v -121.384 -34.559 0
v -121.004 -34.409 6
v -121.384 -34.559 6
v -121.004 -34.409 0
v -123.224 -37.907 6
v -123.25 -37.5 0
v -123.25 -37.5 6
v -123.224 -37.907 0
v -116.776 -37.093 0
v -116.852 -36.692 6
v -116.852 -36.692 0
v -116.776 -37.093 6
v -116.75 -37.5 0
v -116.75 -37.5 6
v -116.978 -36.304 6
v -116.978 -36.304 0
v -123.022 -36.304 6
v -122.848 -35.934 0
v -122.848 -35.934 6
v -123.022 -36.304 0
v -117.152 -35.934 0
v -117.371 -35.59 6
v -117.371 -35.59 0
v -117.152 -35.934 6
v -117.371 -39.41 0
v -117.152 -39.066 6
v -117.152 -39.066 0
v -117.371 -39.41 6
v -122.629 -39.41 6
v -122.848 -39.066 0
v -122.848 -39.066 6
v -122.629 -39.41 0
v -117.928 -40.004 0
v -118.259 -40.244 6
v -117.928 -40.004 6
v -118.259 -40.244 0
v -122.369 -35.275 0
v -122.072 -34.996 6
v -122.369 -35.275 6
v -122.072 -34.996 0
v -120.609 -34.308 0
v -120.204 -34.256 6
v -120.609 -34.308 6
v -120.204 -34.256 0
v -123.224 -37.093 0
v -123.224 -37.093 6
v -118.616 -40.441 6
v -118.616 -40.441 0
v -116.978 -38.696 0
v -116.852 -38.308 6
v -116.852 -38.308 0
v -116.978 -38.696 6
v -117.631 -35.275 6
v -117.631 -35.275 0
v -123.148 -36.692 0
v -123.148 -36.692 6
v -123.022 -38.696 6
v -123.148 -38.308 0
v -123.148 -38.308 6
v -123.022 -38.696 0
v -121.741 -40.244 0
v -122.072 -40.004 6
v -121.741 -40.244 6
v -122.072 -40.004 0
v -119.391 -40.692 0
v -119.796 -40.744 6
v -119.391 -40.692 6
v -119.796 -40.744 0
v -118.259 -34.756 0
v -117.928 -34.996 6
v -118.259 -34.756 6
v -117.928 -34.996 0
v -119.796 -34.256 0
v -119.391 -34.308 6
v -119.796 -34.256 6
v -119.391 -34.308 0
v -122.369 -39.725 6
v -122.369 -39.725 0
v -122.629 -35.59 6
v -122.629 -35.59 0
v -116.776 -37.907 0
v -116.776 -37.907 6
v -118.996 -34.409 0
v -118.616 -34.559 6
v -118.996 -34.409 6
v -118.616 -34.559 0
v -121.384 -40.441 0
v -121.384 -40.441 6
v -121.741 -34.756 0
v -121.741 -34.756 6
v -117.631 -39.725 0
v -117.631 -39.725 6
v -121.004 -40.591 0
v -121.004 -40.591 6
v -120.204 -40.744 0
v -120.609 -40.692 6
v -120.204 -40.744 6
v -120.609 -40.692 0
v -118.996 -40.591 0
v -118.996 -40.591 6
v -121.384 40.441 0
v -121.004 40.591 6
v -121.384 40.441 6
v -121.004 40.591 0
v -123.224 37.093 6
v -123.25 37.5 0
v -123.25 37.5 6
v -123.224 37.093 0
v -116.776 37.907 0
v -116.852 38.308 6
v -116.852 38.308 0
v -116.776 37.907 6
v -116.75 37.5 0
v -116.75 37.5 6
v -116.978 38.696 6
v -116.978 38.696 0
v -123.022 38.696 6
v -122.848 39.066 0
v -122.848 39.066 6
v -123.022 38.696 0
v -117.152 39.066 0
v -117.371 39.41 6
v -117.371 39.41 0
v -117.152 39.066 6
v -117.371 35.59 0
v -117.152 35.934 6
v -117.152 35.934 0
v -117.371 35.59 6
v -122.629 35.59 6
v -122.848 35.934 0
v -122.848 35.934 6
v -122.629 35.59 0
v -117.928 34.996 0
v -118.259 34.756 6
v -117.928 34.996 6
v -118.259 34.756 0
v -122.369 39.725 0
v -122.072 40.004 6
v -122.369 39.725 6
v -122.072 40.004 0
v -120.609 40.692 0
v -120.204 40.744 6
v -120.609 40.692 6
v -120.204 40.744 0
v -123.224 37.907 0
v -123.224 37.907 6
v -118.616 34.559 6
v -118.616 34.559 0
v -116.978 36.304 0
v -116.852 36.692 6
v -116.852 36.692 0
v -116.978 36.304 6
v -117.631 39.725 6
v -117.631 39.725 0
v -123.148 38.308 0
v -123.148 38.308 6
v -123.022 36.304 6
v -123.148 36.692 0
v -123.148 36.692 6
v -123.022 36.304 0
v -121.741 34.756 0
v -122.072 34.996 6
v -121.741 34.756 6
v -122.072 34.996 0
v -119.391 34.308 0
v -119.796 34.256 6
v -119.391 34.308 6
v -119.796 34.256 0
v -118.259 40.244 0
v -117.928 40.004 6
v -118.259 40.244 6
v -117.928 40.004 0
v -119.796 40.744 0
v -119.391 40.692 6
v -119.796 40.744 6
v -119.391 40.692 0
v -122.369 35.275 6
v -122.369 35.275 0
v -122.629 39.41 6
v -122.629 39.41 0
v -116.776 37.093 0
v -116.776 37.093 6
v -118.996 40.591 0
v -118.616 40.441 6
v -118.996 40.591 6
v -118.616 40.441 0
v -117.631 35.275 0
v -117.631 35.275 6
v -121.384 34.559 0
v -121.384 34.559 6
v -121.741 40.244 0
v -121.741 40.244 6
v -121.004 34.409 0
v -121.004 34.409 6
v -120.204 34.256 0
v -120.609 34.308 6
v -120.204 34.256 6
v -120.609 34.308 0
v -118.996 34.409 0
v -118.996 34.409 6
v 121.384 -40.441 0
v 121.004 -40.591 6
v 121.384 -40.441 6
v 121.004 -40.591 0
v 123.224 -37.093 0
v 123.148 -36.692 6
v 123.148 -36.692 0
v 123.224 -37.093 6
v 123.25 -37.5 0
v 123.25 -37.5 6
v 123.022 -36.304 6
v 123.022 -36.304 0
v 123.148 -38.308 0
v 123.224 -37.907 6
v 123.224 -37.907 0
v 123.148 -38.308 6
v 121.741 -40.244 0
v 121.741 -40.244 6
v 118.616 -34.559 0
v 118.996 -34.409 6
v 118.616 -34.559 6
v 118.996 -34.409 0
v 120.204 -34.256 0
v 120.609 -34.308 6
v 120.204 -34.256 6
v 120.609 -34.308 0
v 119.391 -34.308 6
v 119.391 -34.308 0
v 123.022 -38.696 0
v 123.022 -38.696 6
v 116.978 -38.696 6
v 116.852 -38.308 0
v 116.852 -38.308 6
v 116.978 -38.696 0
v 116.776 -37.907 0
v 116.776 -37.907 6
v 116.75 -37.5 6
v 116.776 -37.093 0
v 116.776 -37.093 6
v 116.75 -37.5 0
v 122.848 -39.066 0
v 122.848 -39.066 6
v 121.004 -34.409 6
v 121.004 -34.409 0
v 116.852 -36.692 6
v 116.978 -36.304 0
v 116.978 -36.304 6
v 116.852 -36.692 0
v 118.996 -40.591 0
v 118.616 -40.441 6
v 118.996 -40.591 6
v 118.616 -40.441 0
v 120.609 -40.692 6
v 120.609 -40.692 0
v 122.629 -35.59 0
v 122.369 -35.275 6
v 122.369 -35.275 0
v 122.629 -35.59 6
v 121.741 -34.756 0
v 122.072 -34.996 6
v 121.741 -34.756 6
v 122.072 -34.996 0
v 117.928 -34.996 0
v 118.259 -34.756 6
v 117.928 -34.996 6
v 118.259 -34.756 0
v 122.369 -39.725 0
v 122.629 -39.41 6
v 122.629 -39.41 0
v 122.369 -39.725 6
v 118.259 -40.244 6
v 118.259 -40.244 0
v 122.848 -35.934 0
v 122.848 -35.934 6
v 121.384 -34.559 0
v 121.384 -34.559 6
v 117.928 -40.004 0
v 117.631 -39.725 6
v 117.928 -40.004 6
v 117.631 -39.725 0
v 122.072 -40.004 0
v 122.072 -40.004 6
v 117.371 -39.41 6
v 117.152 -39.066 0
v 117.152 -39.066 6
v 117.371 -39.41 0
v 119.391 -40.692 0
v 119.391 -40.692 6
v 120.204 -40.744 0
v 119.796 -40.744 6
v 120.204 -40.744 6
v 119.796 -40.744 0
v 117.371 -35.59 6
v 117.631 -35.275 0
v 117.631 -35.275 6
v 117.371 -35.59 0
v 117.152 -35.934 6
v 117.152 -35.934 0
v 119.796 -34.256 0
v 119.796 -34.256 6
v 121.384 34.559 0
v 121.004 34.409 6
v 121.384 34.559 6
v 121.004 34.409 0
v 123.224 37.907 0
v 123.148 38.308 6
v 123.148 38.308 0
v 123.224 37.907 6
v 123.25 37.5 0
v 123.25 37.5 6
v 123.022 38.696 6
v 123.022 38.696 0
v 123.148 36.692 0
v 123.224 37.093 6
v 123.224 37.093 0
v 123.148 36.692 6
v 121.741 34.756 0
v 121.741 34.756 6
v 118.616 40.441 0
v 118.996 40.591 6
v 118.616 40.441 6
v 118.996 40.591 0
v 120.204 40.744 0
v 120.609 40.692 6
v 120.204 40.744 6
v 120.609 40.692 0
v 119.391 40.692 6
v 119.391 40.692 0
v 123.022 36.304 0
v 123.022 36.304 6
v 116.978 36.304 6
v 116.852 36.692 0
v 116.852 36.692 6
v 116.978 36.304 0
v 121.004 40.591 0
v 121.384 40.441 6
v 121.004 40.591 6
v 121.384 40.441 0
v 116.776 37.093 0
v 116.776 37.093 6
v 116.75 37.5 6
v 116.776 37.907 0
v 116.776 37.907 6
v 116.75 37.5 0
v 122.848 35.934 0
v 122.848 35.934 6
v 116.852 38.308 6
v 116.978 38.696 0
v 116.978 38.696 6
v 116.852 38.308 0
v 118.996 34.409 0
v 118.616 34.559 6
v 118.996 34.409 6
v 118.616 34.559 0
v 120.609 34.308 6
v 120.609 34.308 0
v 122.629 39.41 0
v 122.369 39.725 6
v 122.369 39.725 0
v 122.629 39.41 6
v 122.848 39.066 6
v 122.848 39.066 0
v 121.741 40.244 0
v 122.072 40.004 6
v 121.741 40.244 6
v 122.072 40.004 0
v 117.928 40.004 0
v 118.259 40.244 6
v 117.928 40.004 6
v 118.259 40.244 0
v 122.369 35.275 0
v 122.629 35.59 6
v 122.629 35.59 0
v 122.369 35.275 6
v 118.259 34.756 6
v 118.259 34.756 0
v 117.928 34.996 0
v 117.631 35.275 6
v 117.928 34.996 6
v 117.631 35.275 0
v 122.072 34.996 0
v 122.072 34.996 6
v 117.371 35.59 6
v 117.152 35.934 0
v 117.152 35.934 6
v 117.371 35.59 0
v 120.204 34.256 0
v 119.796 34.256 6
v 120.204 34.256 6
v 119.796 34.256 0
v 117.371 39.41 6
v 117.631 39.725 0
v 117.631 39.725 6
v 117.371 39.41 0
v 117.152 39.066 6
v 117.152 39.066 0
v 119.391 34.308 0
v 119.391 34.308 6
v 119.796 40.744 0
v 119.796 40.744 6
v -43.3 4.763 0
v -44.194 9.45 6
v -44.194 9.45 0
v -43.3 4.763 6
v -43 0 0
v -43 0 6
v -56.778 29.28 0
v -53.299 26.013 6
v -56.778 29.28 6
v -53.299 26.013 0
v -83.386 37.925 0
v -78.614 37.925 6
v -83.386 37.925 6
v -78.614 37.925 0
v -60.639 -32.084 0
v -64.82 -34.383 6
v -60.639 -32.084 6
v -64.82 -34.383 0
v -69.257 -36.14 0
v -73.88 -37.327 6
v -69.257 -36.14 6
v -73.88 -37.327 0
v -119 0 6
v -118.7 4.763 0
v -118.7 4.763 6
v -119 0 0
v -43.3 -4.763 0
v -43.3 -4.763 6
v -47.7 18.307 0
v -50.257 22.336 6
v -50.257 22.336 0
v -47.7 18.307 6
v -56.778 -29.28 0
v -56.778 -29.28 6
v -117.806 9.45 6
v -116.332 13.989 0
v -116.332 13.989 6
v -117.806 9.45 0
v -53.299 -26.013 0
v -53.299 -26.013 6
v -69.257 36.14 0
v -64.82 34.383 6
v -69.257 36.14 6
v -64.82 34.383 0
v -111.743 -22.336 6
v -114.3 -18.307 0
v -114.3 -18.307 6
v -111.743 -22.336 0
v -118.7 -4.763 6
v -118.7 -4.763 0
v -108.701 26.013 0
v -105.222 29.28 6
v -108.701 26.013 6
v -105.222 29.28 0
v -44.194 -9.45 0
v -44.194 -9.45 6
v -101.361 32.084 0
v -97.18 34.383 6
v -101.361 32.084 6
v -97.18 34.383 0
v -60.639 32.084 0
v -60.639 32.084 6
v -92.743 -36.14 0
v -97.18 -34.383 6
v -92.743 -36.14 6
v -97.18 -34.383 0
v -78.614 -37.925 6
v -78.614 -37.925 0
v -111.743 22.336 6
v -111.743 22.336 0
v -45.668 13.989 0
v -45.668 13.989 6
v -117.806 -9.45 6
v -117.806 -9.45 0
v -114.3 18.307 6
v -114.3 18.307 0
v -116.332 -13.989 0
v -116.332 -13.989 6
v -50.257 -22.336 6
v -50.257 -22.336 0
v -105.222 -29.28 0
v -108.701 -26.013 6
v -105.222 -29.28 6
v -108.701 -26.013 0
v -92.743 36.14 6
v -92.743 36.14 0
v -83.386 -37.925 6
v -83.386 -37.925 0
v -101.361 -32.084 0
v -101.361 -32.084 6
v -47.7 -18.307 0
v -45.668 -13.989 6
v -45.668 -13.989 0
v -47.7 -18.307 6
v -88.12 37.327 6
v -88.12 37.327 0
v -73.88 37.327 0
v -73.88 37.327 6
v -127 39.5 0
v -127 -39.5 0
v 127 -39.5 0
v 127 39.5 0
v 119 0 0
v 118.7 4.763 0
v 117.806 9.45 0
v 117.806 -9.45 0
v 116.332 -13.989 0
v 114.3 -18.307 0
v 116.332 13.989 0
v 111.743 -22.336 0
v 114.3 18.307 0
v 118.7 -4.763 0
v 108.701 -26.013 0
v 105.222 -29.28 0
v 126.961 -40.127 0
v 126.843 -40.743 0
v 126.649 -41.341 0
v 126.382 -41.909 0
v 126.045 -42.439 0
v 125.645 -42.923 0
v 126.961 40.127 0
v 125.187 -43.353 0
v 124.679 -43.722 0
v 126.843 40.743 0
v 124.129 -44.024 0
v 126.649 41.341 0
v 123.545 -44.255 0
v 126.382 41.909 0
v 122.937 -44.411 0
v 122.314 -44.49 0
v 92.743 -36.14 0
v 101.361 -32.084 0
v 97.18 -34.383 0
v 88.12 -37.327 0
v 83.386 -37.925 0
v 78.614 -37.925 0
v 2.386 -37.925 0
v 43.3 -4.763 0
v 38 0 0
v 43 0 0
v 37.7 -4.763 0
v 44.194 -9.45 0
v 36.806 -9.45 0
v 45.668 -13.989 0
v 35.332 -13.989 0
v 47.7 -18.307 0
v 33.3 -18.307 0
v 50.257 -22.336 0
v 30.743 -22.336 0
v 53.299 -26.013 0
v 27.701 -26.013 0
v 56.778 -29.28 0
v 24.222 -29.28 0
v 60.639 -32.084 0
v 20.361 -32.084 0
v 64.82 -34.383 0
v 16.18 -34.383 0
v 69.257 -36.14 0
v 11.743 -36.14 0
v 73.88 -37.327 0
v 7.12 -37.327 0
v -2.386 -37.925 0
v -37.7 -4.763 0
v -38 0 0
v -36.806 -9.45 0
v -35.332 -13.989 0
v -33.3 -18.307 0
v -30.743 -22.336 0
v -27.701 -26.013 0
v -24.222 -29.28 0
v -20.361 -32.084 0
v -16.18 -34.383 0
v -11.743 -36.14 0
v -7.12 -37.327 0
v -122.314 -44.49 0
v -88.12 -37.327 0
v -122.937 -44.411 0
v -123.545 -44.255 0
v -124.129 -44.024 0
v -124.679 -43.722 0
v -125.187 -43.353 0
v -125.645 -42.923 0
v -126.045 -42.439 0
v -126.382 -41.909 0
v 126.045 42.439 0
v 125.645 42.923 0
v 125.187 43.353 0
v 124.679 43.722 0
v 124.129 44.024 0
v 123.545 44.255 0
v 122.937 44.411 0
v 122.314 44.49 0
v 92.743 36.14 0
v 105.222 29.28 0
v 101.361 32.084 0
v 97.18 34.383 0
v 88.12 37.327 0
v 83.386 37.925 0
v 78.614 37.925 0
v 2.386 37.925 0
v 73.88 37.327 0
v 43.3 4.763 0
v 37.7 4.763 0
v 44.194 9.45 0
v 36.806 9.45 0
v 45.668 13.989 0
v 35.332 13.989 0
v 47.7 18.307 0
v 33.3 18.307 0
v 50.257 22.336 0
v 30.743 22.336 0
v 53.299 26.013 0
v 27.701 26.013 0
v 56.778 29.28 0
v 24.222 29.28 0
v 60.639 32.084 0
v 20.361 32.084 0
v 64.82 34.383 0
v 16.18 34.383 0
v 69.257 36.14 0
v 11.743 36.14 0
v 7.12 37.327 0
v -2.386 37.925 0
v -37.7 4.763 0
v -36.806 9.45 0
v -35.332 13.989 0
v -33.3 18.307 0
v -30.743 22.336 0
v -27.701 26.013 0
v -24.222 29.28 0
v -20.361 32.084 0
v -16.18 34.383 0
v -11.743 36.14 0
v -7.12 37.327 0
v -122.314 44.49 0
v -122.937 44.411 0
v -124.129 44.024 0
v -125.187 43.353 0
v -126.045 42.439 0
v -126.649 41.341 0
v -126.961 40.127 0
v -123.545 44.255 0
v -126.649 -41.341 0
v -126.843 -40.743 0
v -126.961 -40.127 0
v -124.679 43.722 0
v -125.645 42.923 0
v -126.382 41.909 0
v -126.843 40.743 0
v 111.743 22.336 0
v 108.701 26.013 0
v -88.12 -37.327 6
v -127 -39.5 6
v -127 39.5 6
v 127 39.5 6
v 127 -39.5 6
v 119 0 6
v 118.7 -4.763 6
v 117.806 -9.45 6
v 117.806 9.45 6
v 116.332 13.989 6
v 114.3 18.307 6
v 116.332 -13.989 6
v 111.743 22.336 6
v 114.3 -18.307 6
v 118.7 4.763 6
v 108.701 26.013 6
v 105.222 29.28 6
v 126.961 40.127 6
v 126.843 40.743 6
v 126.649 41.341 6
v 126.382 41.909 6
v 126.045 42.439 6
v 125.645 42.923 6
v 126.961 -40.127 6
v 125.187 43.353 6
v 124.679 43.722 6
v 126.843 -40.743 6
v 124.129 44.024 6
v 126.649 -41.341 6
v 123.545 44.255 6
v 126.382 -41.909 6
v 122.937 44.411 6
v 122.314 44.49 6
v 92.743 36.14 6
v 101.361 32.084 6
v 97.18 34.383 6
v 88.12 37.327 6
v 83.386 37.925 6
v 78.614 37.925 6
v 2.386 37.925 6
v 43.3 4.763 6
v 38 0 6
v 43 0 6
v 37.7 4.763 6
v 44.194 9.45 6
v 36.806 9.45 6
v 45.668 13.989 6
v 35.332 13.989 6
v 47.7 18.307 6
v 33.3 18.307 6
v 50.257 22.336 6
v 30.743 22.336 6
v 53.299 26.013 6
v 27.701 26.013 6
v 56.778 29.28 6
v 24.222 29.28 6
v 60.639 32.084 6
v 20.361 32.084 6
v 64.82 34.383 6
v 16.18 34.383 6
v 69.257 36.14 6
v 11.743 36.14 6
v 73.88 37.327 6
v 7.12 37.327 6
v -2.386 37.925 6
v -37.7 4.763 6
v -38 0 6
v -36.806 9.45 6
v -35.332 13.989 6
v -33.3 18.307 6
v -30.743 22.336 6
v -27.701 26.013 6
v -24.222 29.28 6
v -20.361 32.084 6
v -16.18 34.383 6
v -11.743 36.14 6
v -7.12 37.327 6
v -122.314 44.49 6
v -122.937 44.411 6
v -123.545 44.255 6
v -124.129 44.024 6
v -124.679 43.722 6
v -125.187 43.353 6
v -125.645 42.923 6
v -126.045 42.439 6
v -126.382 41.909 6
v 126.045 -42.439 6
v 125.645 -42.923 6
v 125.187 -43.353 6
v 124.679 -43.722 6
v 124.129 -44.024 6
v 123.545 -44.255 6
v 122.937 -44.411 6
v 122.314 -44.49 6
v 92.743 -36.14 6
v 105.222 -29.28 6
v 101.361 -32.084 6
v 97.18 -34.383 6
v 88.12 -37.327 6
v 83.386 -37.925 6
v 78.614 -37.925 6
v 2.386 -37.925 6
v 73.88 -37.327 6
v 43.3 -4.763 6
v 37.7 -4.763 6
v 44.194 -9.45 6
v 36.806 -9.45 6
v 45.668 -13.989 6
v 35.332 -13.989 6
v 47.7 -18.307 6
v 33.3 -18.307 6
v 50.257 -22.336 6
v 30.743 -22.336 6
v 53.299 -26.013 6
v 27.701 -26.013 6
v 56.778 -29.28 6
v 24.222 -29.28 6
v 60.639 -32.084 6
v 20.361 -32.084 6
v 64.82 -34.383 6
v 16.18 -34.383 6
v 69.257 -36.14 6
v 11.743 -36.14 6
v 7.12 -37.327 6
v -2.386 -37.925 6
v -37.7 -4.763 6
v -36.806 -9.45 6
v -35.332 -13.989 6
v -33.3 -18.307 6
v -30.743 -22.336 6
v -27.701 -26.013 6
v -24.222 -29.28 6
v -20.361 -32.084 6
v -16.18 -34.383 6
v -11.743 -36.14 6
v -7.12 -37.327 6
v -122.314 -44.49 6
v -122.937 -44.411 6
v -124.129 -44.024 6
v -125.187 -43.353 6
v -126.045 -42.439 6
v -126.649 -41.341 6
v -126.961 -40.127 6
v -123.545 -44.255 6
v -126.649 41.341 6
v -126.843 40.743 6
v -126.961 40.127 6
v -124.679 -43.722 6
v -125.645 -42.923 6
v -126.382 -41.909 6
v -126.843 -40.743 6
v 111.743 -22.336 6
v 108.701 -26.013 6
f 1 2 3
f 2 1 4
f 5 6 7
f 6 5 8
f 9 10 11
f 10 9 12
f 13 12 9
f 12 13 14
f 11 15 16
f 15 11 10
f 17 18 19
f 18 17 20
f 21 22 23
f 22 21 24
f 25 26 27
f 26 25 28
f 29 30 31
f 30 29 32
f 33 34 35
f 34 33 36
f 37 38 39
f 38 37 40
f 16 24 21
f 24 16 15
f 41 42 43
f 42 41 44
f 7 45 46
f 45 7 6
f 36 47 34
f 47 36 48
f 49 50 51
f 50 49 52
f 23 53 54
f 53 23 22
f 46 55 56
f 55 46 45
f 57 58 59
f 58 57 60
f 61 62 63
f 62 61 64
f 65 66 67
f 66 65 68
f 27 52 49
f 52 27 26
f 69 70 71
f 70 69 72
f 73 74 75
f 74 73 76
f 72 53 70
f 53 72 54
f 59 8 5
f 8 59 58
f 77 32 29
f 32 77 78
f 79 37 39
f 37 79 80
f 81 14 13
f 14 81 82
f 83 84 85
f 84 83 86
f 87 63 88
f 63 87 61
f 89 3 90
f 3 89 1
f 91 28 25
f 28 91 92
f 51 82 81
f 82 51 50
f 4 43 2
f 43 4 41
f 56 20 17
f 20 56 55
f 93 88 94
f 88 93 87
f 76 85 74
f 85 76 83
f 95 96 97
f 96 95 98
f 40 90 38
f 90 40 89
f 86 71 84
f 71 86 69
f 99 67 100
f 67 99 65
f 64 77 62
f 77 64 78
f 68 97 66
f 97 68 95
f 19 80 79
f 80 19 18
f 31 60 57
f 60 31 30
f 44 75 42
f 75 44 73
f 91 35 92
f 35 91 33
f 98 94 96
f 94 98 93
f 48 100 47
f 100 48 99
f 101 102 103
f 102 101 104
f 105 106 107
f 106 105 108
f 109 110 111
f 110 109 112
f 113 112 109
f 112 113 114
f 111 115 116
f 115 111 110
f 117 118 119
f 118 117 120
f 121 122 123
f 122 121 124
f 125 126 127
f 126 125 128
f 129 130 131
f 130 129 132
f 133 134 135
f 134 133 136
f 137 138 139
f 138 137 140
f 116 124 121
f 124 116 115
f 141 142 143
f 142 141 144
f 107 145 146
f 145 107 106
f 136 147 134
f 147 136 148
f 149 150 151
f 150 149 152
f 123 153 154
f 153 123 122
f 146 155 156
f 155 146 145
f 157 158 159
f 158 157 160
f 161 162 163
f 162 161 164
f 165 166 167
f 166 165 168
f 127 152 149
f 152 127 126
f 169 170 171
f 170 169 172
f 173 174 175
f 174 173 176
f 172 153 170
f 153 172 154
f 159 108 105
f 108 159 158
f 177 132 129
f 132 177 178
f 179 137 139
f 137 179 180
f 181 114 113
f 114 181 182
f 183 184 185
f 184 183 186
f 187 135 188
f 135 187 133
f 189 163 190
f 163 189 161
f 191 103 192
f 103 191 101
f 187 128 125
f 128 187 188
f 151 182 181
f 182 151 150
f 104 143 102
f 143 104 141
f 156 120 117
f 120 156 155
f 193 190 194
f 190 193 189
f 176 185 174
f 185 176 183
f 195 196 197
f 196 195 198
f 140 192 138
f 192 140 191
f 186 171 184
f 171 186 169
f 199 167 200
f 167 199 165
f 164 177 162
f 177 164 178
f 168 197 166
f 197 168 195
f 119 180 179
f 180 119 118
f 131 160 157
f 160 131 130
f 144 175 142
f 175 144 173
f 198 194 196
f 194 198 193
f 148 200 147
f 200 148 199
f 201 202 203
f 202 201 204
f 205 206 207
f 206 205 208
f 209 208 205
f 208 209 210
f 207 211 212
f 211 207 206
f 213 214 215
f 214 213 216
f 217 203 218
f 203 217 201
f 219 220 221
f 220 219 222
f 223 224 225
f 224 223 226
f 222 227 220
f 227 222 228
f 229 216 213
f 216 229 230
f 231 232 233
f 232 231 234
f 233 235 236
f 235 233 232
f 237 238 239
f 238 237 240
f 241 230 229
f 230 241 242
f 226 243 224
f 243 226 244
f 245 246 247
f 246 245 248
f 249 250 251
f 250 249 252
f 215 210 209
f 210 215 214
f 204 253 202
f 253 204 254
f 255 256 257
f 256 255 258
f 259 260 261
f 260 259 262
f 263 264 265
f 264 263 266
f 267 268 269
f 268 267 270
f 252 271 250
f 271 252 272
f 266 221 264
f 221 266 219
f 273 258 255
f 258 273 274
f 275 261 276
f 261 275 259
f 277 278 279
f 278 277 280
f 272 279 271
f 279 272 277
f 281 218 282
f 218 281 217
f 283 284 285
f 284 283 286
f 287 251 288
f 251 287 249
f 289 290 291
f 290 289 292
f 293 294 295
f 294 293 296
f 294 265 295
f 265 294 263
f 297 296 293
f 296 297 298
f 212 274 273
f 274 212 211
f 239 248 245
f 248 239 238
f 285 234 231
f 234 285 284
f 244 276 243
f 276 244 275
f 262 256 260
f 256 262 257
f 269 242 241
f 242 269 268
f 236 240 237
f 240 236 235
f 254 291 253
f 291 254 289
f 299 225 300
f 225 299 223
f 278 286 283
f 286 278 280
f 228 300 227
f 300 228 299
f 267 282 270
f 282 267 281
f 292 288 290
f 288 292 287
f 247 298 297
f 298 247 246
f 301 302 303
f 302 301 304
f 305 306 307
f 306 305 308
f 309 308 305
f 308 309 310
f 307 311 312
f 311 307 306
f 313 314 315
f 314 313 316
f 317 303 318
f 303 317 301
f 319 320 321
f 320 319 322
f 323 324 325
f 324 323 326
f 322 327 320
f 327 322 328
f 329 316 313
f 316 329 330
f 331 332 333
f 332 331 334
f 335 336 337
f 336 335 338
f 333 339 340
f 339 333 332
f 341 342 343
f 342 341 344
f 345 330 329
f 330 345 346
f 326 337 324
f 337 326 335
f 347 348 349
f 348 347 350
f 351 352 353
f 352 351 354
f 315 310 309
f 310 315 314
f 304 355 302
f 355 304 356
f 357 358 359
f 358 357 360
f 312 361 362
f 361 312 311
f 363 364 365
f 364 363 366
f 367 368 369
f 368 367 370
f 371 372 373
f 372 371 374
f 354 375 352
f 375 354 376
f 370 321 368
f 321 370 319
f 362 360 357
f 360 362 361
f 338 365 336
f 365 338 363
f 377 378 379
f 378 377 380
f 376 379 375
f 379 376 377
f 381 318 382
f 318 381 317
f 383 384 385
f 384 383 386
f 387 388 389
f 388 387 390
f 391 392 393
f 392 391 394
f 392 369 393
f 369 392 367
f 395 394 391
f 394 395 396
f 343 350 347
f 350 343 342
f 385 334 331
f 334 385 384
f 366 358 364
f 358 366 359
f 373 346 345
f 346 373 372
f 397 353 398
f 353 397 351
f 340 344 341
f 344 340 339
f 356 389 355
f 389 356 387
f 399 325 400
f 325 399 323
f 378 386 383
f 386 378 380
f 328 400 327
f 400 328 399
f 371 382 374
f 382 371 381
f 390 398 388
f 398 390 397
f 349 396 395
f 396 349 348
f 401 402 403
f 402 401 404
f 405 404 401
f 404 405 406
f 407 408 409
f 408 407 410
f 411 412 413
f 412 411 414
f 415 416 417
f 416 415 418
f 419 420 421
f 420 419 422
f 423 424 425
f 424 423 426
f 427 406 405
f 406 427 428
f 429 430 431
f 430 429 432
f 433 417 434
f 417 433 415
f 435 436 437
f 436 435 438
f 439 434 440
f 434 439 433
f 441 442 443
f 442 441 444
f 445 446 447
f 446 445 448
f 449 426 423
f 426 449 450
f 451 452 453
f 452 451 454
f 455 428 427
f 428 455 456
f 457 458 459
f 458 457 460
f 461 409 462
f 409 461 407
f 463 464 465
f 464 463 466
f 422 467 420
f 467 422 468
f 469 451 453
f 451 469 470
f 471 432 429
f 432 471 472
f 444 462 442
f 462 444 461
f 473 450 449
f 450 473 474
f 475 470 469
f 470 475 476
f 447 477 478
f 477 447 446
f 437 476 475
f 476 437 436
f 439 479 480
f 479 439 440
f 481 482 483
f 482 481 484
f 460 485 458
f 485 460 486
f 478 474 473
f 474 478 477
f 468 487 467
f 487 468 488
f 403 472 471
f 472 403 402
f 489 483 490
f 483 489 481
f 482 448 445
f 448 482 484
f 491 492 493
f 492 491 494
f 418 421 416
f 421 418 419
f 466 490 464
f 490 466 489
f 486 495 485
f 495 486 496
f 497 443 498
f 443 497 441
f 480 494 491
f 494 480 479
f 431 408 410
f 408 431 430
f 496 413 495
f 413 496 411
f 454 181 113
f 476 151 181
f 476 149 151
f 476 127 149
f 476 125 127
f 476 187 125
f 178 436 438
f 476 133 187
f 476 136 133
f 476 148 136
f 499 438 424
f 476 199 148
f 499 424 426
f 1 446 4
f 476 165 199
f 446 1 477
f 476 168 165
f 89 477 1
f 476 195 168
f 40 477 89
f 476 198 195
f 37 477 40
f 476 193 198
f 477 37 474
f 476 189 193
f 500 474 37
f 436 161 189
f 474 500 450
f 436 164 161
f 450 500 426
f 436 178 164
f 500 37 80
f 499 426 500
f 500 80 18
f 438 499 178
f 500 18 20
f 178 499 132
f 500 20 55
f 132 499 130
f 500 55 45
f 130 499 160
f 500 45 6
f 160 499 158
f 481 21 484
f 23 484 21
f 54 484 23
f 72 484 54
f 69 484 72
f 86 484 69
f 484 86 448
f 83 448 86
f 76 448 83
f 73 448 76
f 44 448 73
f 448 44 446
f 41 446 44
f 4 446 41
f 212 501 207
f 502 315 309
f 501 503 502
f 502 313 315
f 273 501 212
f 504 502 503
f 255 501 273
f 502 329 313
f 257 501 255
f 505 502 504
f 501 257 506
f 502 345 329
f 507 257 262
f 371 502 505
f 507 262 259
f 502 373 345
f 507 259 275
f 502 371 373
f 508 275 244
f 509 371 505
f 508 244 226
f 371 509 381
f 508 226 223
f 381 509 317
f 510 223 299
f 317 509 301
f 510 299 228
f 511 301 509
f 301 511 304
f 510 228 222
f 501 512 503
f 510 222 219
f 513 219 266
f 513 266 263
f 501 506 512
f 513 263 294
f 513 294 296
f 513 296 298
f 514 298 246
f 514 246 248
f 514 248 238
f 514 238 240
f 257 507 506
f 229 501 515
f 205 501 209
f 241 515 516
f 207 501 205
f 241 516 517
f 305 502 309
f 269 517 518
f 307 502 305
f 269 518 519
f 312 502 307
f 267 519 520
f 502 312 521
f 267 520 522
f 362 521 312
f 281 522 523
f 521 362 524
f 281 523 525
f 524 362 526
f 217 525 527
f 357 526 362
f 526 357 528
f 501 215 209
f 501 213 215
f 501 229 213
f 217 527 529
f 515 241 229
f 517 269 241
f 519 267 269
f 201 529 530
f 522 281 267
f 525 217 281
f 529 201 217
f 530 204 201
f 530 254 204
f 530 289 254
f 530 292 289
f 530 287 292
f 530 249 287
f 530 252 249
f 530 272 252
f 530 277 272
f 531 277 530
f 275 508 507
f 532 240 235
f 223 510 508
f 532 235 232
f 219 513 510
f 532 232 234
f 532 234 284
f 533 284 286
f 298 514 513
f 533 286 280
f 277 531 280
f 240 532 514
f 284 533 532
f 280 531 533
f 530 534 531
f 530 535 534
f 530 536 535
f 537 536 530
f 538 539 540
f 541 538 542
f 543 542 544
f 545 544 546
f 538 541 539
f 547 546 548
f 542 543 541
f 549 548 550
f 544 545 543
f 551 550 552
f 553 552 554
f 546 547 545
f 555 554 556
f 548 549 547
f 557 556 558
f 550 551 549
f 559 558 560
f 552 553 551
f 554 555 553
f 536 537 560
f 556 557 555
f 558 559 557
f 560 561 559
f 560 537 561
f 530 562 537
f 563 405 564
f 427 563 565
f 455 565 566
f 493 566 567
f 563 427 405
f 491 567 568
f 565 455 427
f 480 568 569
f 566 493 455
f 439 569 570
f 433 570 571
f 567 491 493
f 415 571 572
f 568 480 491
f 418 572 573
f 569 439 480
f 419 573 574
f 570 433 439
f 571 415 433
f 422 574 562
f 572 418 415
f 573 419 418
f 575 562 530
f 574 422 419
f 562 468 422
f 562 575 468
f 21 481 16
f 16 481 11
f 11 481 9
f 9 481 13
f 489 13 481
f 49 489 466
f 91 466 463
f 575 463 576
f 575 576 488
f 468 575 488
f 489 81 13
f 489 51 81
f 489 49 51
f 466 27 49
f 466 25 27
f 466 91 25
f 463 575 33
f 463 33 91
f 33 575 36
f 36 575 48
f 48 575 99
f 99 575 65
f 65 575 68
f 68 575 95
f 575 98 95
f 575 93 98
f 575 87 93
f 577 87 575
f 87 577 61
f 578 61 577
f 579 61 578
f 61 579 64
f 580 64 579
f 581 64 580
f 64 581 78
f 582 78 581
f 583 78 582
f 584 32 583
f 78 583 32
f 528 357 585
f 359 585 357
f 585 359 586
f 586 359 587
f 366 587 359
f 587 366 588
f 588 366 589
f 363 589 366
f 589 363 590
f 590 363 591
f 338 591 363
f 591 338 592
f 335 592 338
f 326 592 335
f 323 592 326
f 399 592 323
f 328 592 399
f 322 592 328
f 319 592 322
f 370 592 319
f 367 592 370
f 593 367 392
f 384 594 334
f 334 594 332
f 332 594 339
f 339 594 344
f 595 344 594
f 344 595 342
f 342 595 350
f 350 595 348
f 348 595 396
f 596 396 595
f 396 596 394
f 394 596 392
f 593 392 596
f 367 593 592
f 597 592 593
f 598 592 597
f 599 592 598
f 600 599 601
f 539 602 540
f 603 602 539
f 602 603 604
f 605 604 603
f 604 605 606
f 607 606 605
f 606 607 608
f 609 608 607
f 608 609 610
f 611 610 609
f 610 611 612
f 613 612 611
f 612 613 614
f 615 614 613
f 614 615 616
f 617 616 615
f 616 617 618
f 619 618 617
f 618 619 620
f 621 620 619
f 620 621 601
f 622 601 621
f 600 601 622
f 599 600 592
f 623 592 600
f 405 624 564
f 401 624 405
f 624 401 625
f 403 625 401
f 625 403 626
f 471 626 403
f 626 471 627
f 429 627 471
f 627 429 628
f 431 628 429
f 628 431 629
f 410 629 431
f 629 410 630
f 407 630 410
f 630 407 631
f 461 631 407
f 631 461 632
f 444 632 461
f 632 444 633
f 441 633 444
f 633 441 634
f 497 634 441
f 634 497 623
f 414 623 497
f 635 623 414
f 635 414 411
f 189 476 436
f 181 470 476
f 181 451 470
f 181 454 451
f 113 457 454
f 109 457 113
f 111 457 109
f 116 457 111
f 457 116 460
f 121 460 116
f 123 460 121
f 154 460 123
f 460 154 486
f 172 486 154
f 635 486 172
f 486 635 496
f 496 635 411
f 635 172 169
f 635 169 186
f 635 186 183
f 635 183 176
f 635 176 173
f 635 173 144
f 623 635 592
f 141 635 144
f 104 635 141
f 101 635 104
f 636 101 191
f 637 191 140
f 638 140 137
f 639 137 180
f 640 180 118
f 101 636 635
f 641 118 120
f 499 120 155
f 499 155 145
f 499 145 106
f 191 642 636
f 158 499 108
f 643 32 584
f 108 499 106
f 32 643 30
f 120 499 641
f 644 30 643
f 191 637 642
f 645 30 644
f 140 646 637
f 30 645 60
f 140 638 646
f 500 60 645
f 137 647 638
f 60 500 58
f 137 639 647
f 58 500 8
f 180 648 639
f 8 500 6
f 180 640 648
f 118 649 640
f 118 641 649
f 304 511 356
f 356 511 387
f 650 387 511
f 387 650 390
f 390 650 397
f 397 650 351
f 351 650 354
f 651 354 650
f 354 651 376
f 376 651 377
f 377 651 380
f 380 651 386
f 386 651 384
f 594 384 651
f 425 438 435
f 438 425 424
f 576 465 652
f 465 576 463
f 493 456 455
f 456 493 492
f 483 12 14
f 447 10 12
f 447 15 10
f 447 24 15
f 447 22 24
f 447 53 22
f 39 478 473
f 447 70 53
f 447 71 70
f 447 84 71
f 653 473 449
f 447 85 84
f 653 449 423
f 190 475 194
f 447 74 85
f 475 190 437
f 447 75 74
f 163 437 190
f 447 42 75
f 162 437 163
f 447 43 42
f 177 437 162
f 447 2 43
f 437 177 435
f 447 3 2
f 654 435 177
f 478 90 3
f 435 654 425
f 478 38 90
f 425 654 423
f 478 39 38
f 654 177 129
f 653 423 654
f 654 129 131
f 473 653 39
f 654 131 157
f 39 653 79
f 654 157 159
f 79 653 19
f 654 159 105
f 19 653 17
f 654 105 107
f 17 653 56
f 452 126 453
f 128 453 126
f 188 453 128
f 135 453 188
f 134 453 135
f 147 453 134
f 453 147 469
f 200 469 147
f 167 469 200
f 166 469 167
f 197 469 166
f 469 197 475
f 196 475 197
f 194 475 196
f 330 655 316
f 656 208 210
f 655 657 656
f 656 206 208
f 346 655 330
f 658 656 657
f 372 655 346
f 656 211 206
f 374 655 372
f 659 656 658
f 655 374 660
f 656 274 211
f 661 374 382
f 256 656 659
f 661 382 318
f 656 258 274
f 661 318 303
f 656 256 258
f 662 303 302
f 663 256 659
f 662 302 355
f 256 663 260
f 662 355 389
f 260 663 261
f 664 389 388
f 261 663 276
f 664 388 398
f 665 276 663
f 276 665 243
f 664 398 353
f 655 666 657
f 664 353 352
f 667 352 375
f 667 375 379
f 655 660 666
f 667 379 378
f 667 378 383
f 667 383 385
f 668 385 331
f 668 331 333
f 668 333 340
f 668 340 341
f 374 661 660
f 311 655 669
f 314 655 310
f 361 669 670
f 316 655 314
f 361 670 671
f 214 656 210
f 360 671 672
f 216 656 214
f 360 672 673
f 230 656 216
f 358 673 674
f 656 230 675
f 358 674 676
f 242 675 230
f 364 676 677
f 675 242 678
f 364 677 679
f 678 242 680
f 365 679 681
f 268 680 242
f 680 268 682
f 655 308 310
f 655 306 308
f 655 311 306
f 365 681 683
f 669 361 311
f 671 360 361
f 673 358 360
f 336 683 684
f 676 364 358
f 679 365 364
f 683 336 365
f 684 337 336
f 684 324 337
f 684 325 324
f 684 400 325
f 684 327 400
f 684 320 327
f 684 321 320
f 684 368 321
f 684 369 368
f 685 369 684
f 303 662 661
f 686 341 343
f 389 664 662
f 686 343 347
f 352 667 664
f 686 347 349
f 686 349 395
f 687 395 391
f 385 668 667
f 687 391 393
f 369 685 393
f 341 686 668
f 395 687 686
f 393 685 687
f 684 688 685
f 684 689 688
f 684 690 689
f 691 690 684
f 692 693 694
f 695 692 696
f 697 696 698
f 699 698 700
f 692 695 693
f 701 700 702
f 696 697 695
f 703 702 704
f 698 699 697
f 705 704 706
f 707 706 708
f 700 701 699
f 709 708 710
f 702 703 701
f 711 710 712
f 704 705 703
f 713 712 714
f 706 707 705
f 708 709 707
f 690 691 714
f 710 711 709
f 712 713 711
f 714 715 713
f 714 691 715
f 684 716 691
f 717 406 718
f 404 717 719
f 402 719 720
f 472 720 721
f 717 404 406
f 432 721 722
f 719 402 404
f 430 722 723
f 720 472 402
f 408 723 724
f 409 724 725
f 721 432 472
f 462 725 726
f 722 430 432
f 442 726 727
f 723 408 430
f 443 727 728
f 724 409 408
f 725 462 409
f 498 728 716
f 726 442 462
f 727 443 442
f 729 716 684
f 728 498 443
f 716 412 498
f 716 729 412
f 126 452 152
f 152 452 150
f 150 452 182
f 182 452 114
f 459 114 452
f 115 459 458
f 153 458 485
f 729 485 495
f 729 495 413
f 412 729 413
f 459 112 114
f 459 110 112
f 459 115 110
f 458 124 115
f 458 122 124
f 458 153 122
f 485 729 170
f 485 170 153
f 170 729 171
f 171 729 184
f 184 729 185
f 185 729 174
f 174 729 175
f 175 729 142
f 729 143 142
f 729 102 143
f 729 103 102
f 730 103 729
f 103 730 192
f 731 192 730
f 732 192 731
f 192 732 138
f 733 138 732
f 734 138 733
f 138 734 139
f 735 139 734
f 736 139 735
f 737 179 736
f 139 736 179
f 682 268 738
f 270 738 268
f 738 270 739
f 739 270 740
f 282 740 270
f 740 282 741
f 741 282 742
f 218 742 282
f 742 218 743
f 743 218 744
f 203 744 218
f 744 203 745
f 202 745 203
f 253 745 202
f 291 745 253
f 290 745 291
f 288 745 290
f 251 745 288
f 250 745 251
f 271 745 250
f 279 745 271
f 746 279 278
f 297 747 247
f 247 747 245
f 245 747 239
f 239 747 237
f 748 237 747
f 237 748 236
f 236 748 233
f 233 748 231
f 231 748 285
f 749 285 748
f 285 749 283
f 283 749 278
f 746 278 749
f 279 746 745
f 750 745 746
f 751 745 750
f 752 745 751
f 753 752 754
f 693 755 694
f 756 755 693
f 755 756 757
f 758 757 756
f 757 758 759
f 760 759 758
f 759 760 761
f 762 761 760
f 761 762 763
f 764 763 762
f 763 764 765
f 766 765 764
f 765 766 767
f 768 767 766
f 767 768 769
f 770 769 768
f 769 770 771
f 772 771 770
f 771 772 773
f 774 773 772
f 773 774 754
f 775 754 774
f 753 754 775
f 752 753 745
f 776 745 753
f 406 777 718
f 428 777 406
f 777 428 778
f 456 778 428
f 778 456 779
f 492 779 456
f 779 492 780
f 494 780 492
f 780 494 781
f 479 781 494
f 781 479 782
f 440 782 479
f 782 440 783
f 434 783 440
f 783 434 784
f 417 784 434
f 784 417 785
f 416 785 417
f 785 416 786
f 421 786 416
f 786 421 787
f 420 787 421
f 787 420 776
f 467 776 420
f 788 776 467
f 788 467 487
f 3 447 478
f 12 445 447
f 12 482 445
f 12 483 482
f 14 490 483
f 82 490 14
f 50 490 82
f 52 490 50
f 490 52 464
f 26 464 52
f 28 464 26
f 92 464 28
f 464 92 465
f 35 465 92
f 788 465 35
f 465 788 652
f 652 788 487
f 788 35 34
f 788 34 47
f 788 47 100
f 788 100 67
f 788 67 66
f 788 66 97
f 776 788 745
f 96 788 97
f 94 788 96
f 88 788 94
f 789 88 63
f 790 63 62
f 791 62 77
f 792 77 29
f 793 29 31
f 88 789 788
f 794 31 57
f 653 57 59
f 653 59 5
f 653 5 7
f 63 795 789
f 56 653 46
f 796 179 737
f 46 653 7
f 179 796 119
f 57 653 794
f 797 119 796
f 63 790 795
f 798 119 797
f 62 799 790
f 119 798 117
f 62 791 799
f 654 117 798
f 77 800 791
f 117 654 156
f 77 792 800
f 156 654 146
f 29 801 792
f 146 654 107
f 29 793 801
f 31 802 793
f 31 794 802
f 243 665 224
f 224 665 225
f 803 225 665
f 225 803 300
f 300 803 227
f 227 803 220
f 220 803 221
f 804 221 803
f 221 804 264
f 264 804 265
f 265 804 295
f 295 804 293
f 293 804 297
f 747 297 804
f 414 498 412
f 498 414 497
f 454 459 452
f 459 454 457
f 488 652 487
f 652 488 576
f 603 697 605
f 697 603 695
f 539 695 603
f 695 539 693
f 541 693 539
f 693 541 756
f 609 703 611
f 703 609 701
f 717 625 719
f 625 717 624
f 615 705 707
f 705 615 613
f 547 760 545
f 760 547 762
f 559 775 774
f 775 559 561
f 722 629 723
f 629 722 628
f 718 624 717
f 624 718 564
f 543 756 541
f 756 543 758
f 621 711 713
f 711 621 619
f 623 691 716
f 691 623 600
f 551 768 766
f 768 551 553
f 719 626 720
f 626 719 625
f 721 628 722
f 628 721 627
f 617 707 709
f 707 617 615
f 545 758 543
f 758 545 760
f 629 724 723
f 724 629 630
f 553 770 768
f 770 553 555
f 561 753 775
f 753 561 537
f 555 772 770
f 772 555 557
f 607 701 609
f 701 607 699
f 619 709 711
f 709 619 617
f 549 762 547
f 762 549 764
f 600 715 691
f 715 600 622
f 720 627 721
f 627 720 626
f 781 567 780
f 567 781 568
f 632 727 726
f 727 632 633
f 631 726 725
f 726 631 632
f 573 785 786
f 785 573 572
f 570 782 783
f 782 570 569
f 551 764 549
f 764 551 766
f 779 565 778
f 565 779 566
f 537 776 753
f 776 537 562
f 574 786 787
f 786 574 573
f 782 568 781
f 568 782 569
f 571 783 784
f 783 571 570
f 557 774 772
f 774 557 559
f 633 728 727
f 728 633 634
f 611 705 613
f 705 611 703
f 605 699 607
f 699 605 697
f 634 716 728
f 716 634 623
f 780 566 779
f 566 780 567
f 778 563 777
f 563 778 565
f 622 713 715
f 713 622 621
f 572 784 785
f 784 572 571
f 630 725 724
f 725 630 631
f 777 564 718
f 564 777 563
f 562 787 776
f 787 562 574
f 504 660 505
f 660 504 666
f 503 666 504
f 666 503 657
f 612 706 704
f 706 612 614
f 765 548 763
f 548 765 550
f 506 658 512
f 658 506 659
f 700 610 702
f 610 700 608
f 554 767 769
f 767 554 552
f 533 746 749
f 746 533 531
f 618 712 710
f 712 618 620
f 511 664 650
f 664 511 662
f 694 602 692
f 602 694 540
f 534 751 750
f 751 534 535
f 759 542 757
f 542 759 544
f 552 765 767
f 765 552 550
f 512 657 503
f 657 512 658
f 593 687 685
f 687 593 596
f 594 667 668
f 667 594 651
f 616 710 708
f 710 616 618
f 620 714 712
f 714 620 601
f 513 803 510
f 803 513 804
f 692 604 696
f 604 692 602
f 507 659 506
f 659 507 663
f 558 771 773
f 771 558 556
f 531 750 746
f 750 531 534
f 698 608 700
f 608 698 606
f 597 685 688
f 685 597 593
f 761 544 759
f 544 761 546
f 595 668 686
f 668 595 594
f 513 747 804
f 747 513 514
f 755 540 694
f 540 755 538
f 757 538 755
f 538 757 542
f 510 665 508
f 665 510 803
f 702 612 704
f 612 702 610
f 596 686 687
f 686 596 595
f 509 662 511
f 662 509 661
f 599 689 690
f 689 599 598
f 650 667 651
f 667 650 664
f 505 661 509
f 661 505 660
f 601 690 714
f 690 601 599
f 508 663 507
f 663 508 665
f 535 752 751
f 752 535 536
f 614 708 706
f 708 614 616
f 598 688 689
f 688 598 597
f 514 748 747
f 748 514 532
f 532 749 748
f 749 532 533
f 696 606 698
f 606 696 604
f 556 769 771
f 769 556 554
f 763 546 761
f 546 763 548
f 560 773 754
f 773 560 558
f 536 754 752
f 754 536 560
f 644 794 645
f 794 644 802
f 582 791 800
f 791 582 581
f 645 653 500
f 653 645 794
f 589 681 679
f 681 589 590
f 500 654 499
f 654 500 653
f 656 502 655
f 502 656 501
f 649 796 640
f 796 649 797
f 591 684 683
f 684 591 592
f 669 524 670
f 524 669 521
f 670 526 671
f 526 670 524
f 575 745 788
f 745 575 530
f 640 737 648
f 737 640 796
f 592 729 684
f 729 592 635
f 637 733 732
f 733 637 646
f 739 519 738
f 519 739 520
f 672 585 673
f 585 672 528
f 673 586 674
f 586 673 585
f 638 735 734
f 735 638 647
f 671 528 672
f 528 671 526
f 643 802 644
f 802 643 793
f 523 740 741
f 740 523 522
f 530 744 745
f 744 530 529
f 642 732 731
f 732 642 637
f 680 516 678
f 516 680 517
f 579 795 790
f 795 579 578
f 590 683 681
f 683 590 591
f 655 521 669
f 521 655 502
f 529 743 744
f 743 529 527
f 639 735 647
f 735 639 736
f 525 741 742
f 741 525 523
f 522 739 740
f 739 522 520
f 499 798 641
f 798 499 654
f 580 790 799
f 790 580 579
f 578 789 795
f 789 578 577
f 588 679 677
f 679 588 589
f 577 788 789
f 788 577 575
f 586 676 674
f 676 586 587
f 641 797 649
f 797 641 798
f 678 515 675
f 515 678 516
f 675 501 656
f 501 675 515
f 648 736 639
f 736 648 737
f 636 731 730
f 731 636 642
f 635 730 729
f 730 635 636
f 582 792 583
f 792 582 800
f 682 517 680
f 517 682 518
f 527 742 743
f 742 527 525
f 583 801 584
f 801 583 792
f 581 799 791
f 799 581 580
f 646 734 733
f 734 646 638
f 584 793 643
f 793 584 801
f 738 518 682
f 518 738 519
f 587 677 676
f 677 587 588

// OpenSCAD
$fn = 50;


difference() {
	union() {
		hull() {
			translate(v = [-122.0000000000, 39.5000000000, 0]) {
				cylinder(h = 6, r = 5);
			}
			translate(v = [122.0000000000, 39.5000000000, 0]) {
				cylinder(h = 6, r = 5);
			}
			translate(v = [-122.0000000000, -39.5000000000, 0]) {
				cylinder(h = 6, r = 5);
			}
			translate(v = [122.0000000000, -39.5000000000, 0]) {
				cylinder(h = 6, r = 5);
			}
		}
	}
	union() {
		#translate(v = [-120.0000000000, -37.5000000000, -100.0000000000]) {
			cylinder(h = 200, r = 3.2500000000);
		}
		#translate(v = [-120.0000000000, 37.5000000000, -100.0000000000]) {
			cylinder(h = 200, r = 3.2500000000);
		}
		#translate(v = [120.0000000000, -37.5000000000, -100.0000000000]) {
			cylinder(h = 200, r = 3.2500000000);
		}
		#translate(v = [120.0000000000, 37.5000000000, -100.0000000000]) {
			cylinder(h = 200, r = 3.2500000000);
		}
		#translate(v = [-81.0000000000, 0, 0]) {
			cylinder(h = 6, r = 38.0000000000);
		}
		#cylinder(h = 6, r = 38.0000000000);
		#translate(v = [81.0000000000, 0, 0]) {
			cylinder(h = 6, r = 38.0000000000);
		}
	}
}
